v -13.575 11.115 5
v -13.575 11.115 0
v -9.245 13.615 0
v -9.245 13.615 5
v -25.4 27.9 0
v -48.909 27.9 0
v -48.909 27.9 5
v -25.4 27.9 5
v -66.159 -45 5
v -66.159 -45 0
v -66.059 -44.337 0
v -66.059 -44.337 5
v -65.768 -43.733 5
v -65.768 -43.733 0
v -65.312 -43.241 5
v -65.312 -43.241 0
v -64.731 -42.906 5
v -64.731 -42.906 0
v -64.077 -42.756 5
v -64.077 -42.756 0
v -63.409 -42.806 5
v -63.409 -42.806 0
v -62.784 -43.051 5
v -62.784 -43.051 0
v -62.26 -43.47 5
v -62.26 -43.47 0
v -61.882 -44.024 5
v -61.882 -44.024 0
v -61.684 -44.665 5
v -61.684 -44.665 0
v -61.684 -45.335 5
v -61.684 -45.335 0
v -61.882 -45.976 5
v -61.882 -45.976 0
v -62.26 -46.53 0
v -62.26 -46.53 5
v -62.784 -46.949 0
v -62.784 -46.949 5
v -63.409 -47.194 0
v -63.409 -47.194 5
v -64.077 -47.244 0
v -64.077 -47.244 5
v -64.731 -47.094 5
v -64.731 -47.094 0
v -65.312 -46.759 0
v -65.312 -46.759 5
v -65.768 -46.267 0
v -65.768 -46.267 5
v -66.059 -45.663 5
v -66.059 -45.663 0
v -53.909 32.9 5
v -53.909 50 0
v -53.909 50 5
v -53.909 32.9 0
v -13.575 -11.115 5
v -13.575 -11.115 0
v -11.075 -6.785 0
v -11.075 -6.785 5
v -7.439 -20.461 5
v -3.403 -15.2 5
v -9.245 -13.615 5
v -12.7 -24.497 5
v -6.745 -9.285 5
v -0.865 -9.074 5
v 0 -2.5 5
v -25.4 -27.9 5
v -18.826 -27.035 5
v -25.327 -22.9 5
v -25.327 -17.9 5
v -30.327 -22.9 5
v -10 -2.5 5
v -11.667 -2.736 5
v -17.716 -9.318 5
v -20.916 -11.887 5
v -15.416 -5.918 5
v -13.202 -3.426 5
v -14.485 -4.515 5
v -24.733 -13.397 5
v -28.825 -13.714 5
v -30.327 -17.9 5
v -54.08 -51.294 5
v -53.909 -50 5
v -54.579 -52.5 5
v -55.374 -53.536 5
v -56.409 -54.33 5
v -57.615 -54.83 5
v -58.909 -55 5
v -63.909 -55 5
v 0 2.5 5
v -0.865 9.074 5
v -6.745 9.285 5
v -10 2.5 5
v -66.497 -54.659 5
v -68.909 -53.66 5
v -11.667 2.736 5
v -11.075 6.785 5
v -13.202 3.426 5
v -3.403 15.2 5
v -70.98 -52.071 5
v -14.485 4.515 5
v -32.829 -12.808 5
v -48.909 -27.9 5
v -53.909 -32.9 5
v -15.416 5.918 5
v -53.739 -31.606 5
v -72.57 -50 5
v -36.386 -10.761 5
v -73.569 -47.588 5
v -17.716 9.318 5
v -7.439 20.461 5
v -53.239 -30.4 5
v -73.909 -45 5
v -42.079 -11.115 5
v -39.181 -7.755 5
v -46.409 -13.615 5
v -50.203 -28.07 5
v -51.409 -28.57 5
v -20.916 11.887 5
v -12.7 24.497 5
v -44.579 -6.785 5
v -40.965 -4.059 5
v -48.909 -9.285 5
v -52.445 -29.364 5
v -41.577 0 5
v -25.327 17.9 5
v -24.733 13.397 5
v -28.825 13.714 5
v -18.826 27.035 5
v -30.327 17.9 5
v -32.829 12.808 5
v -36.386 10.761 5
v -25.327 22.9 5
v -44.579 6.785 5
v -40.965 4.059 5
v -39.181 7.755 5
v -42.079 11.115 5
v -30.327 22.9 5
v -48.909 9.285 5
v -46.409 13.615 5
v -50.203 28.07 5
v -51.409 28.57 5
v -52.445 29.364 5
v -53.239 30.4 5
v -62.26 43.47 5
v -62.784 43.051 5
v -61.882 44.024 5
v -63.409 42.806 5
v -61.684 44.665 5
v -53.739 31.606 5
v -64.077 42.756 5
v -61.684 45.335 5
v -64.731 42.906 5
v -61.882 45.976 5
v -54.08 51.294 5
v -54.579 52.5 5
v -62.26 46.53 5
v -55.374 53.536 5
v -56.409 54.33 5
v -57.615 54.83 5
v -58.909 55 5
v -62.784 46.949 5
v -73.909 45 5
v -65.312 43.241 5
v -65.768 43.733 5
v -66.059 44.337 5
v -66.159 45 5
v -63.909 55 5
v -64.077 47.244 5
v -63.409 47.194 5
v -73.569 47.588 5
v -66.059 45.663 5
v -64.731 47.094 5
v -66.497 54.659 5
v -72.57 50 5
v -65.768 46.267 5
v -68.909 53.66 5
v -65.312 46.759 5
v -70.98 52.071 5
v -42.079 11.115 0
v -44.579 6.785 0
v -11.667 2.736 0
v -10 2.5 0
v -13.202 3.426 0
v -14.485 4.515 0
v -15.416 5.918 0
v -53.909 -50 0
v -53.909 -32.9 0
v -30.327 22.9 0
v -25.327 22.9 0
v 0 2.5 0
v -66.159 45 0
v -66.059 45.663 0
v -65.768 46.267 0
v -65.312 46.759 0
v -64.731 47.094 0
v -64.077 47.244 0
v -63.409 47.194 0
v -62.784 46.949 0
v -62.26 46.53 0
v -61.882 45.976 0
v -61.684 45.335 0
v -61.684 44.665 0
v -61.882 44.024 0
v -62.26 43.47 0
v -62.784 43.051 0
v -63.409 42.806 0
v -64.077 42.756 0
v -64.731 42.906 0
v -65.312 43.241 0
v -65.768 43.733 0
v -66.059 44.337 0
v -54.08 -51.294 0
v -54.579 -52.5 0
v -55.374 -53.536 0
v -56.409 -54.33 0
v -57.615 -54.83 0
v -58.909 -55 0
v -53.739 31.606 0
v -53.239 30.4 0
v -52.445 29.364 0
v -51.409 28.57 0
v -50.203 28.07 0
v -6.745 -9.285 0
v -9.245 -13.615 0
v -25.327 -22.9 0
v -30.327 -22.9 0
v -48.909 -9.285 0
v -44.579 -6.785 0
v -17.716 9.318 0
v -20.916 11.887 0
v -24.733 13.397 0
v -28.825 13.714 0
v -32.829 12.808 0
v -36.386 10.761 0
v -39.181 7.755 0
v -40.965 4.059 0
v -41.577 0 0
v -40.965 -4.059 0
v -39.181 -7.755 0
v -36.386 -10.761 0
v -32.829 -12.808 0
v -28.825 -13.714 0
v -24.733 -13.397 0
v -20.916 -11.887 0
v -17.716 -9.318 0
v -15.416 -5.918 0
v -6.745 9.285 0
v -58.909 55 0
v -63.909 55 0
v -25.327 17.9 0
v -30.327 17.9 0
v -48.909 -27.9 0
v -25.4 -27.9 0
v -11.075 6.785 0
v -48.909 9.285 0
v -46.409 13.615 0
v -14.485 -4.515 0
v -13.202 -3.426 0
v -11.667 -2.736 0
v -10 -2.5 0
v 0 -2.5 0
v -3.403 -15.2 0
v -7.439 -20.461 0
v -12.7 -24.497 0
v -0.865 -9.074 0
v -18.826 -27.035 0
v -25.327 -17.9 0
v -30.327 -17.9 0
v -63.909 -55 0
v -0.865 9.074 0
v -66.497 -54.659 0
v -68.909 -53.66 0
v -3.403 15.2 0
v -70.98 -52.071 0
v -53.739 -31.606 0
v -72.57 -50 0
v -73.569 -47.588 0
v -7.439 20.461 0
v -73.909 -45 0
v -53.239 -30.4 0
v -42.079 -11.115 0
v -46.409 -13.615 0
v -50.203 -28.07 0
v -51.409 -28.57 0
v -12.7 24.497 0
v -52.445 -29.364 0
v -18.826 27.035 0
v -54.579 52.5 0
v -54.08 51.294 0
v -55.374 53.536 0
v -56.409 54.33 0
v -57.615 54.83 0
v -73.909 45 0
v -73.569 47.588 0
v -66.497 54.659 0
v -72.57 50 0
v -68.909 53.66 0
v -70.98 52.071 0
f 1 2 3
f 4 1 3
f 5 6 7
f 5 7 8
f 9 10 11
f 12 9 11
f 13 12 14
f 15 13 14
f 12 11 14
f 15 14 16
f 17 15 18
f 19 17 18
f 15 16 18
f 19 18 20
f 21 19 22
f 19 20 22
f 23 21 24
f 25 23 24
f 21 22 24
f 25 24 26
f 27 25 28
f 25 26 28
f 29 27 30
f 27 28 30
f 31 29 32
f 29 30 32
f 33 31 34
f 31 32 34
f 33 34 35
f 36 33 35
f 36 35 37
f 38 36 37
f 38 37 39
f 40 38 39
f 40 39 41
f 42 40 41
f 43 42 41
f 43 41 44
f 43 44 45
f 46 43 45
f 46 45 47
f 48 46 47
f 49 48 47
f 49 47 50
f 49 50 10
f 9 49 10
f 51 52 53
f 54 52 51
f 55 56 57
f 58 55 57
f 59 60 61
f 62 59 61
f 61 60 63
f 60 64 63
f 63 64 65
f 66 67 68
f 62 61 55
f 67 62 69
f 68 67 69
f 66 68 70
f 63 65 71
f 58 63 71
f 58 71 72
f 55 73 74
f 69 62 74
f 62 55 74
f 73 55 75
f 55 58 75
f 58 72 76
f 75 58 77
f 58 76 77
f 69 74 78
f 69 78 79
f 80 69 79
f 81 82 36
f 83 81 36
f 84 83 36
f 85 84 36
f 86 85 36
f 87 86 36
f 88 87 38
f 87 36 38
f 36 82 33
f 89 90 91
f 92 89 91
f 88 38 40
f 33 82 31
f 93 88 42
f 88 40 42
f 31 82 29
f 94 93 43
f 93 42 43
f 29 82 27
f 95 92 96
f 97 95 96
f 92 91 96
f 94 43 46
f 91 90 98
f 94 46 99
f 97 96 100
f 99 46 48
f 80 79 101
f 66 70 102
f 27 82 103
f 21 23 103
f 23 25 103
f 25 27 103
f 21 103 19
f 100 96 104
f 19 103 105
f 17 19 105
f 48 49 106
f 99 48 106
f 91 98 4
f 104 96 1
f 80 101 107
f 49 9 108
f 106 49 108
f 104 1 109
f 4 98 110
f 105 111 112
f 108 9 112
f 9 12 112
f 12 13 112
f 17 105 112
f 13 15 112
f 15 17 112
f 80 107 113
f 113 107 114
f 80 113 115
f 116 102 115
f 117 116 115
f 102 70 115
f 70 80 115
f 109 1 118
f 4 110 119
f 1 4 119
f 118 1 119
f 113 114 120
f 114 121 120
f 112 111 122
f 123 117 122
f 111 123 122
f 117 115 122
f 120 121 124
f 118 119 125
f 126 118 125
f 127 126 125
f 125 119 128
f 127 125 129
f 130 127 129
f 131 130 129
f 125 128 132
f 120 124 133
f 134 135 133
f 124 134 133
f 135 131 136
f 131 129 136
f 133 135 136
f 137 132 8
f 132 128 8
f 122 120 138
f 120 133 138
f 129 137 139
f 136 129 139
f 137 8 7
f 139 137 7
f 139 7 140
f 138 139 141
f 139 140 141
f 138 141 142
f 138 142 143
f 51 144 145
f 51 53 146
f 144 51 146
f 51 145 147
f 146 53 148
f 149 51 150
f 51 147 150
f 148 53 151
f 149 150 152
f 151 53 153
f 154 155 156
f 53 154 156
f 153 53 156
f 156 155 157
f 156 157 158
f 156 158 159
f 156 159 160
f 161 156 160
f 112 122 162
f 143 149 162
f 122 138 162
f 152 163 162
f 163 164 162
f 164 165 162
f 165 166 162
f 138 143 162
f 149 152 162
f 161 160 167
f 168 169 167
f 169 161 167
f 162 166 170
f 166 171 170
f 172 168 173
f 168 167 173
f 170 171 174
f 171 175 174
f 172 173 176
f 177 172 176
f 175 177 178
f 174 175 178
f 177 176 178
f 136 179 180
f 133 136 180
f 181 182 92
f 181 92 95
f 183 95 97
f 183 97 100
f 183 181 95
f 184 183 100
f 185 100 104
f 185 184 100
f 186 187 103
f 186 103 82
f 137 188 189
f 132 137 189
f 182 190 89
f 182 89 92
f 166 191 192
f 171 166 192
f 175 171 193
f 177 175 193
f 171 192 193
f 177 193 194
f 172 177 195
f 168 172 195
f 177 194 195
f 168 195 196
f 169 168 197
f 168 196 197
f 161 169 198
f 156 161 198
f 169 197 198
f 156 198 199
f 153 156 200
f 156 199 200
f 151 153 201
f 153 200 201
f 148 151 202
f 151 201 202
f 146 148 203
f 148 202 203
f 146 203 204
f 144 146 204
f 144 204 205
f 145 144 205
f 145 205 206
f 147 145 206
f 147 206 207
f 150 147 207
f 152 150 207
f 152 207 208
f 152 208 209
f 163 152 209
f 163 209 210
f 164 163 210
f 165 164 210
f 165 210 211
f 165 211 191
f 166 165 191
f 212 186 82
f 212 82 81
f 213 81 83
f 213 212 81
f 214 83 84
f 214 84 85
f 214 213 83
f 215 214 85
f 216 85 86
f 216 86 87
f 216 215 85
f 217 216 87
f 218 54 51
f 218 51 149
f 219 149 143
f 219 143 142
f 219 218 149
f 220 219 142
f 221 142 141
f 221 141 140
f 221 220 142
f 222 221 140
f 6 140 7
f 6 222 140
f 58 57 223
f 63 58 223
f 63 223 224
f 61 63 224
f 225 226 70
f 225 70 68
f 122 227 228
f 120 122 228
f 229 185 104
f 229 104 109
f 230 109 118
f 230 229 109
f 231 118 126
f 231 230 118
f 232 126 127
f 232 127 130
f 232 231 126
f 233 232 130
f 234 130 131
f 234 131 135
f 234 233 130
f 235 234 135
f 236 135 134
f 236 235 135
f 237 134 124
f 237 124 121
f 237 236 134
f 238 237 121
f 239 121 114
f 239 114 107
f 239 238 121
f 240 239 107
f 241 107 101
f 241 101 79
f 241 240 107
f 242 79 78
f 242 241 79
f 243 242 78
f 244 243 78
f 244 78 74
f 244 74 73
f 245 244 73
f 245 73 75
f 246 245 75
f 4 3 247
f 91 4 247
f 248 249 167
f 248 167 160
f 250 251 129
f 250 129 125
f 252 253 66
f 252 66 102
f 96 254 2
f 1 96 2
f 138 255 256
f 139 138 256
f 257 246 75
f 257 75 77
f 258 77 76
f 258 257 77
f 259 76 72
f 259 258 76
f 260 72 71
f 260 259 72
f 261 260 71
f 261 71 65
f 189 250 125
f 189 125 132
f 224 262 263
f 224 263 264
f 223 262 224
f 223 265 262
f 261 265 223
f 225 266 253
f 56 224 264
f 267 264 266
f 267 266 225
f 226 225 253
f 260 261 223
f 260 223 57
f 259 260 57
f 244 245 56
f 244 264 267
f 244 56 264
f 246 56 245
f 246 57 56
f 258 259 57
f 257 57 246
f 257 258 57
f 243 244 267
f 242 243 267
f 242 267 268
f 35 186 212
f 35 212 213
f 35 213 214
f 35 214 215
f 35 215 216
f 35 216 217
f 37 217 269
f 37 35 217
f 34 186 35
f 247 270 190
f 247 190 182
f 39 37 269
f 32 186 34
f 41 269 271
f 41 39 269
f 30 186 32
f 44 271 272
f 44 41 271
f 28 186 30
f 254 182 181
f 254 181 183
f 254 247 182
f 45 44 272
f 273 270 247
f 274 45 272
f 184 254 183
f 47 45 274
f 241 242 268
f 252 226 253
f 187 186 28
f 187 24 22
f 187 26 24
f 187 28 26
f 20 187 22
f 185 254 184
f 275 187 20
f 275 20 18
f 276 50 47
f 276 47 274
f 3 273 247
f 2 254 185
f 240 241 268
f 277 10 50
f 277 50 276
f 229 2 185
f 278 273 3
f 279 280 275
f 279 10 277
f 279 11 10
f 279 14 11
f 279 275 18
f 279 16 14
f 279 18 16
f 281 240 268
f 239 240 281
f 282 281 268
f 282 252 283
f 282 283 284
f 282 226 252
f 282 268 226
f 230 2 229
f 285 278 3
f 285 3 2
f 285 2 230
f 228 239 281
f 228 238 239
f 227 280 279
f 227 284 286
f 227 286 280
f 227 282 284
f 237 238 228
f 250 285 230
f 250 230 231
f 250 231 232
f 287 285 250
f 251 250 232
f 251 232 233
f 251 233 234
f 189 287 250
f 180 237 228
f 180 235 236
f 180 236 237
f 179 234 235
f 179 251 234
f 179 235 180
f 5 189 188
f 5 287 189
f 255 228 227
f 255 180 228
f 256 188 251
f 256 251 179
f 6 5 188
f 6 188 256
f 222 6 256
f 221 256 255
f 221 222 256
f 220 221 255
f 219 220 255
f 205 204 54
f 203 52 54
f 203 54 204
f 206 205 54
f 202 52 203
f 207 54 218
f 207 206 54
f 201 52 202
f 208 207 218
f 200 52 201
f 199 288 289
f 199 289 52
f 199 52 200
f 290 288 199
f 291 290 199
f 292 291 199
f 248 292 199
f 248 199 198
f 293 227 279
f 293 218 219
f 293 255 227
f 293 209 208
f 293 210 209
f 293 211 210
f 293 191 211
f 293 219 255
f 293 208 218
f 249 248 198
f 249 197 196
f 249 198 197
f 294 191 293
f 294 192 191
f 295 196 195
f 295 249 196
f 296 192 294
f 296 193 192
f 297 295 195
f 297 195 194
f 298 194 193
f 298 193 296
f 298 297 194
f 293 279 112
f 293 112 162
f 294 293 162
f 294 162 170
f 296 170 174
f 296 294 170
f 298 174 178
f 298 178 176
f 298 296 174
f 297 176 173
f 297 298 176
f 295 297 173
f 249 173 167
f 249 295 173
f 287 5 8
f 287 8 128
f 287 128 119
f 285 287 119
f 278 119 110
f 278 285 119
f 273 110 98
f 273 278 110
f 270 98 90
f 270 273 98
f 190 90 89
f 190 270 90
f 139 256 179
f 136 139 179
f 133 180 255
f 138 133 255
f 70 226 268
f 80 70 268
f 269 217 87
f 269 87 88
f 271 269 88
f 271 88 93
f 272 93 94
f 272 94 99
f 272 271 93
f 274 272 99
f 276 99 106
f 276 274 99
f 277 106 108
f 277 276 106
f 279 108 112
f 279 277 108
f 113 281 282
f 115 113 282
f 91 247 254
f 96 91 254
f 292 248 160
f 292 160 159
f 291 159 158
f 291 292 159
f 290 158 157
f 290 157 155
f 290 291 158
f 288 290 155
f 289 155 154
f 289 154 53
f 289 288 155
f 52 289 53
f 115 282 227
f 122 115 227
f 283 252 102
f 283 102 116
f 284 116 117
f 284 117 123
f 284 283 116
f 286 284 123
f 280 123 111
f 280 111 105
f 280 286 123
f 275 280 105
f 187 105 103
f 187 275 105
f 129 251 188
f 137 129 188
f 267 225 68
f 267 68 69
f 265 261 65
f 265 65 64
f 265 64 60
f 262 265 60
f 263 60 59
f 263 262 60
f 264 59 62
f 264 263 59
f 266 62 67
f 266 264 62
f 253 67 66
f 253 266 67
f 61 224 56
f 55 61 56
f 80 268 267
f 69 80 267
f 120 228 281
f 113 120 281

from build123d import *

# Parameters (mm, degrees)
ESQUISSE1_W        = 5
ESQUISSE1_H        = 5
BOSS_EXTRU_1_DEPTH = 5
D_GAGEMENT_M41_D   = 4.5


with BuildPart() as part:
    # Esquisse1 → Boss.-Extru.1 (new body)
    with BuildSketch(Plane.XY):
        with BuildLine():
            Line((-58.909278233, -55), (-63.909278233, -55))
            ThreePointArc((-63.909278233, -55), (-70.980346045, -52.071067812), (-73.909278233, -45))
            Line((-73.909278233, -45), (-73.909278233, 45))
            ThreePointArc((-73.909278233, 45), (-70.980346045, 52.071067812), (-63.909278233, 55))
            Line((-63.909278233, 55), (-58.909278233, 55))
            ThreePointArc((-58.909278233, 55), (-55.373744327, 53.535533906), (-53.909278233, 50))
            Line((-53.909278233, 50), (-53.909278233, 32.9))
            ThreePointArc((-53.909278233, 32.9), (-52.444812139, 29.364466094), (-48.909278233, 27.9))
            Line((-48.909278233, 27.9), (-25.4, 27.9))
            ThreePointArc((-25.4, 27.9), (-7.439487758, 20.460512242), (0, 2.5))
            Line((0, 2.5), (-10, 2.5))
            ThreePointArc((-10, 2.5), (-13.202056301, 3.42586604), (-15.41588754, 5.917721519))
            ThreePointArc((-15.41588754, 5.917721519), (-41.577296486, 0), (-15.41588754, -5.917721519))
            ThreePointArc((-15.41588754, -5.917721519), (-13.202056301, -3.42586604), (-10, -2.5))
            Line((-10, -2.5), (0, -2.5))
            ThreePointArc((0, -2.5), (-7.439487758, -20.460512242), (-25.4, -27.9))
            Line((-25.4, -27.9), (-48.909278233, -27.9))
            ThreePointArc((-48.909278233, -27.9), (-52.444812139, -29.364466094), (-53.909278233, -32.9))
            Line((-53.909278233, -32.9), (-53.909278233, -50))
            ThreePointArc((-53.909278233, -50), (-55.373744327, -53.535533906), (-58.909278233, -55))
        make_face()
        with Locations((-27.827296486, 20.4)):
            Rectangle(ESQUISSE1_W, ESQUISSE1_H, mode=Mode.SUBTRACT)
        Polygon((-9.245314739, 13.615063509), (-6.745314739, 9.284936491), (-11.075441758, 6.784936491), (-13.575441758, 11.115063509), align=None, mode=Mode.SUBTRACT)
        Polygon((-6.745314739, -9.284936491), (-9.245314739, -13.615063509), (-13.575441758, -11.115063509), (-11.075441758, -6.784936491), align=None, mode=Mode.SUBTRACT)
        with Locations((-27.827296486, -20.4)):
            Rectangle(ESQUISSE1_W, ESQUISSE1_H, mode=Mode.SUBTRACT)
        Polygon((-46.409278233, -13.615063509), (-48.909278233, -9.284936491), (-44.579151214, -6.784936491), (-42.079151214, -11.115063509), align=None, mode=Mode.SUBTRACT)
        Polygon((-48.909278233, 9.284936491), (-46.409278233, 13.615063509), (-42.079151214, 11.115063509), (-44.579151214, 6.784936491), align=None, mode=Mode.SUBTRACT)
    extrude(amount=BOSS_EXTRU_1_DEPTH)

    # Dégagement M41 (through all)
    with Locations(Plane.XY.offset(5)):
        with Locations((-63.909278233, 45), (-63.909278233, -45)):
            Hole(D_GAGEMENT_M41_D / 2)


solid = part.part
